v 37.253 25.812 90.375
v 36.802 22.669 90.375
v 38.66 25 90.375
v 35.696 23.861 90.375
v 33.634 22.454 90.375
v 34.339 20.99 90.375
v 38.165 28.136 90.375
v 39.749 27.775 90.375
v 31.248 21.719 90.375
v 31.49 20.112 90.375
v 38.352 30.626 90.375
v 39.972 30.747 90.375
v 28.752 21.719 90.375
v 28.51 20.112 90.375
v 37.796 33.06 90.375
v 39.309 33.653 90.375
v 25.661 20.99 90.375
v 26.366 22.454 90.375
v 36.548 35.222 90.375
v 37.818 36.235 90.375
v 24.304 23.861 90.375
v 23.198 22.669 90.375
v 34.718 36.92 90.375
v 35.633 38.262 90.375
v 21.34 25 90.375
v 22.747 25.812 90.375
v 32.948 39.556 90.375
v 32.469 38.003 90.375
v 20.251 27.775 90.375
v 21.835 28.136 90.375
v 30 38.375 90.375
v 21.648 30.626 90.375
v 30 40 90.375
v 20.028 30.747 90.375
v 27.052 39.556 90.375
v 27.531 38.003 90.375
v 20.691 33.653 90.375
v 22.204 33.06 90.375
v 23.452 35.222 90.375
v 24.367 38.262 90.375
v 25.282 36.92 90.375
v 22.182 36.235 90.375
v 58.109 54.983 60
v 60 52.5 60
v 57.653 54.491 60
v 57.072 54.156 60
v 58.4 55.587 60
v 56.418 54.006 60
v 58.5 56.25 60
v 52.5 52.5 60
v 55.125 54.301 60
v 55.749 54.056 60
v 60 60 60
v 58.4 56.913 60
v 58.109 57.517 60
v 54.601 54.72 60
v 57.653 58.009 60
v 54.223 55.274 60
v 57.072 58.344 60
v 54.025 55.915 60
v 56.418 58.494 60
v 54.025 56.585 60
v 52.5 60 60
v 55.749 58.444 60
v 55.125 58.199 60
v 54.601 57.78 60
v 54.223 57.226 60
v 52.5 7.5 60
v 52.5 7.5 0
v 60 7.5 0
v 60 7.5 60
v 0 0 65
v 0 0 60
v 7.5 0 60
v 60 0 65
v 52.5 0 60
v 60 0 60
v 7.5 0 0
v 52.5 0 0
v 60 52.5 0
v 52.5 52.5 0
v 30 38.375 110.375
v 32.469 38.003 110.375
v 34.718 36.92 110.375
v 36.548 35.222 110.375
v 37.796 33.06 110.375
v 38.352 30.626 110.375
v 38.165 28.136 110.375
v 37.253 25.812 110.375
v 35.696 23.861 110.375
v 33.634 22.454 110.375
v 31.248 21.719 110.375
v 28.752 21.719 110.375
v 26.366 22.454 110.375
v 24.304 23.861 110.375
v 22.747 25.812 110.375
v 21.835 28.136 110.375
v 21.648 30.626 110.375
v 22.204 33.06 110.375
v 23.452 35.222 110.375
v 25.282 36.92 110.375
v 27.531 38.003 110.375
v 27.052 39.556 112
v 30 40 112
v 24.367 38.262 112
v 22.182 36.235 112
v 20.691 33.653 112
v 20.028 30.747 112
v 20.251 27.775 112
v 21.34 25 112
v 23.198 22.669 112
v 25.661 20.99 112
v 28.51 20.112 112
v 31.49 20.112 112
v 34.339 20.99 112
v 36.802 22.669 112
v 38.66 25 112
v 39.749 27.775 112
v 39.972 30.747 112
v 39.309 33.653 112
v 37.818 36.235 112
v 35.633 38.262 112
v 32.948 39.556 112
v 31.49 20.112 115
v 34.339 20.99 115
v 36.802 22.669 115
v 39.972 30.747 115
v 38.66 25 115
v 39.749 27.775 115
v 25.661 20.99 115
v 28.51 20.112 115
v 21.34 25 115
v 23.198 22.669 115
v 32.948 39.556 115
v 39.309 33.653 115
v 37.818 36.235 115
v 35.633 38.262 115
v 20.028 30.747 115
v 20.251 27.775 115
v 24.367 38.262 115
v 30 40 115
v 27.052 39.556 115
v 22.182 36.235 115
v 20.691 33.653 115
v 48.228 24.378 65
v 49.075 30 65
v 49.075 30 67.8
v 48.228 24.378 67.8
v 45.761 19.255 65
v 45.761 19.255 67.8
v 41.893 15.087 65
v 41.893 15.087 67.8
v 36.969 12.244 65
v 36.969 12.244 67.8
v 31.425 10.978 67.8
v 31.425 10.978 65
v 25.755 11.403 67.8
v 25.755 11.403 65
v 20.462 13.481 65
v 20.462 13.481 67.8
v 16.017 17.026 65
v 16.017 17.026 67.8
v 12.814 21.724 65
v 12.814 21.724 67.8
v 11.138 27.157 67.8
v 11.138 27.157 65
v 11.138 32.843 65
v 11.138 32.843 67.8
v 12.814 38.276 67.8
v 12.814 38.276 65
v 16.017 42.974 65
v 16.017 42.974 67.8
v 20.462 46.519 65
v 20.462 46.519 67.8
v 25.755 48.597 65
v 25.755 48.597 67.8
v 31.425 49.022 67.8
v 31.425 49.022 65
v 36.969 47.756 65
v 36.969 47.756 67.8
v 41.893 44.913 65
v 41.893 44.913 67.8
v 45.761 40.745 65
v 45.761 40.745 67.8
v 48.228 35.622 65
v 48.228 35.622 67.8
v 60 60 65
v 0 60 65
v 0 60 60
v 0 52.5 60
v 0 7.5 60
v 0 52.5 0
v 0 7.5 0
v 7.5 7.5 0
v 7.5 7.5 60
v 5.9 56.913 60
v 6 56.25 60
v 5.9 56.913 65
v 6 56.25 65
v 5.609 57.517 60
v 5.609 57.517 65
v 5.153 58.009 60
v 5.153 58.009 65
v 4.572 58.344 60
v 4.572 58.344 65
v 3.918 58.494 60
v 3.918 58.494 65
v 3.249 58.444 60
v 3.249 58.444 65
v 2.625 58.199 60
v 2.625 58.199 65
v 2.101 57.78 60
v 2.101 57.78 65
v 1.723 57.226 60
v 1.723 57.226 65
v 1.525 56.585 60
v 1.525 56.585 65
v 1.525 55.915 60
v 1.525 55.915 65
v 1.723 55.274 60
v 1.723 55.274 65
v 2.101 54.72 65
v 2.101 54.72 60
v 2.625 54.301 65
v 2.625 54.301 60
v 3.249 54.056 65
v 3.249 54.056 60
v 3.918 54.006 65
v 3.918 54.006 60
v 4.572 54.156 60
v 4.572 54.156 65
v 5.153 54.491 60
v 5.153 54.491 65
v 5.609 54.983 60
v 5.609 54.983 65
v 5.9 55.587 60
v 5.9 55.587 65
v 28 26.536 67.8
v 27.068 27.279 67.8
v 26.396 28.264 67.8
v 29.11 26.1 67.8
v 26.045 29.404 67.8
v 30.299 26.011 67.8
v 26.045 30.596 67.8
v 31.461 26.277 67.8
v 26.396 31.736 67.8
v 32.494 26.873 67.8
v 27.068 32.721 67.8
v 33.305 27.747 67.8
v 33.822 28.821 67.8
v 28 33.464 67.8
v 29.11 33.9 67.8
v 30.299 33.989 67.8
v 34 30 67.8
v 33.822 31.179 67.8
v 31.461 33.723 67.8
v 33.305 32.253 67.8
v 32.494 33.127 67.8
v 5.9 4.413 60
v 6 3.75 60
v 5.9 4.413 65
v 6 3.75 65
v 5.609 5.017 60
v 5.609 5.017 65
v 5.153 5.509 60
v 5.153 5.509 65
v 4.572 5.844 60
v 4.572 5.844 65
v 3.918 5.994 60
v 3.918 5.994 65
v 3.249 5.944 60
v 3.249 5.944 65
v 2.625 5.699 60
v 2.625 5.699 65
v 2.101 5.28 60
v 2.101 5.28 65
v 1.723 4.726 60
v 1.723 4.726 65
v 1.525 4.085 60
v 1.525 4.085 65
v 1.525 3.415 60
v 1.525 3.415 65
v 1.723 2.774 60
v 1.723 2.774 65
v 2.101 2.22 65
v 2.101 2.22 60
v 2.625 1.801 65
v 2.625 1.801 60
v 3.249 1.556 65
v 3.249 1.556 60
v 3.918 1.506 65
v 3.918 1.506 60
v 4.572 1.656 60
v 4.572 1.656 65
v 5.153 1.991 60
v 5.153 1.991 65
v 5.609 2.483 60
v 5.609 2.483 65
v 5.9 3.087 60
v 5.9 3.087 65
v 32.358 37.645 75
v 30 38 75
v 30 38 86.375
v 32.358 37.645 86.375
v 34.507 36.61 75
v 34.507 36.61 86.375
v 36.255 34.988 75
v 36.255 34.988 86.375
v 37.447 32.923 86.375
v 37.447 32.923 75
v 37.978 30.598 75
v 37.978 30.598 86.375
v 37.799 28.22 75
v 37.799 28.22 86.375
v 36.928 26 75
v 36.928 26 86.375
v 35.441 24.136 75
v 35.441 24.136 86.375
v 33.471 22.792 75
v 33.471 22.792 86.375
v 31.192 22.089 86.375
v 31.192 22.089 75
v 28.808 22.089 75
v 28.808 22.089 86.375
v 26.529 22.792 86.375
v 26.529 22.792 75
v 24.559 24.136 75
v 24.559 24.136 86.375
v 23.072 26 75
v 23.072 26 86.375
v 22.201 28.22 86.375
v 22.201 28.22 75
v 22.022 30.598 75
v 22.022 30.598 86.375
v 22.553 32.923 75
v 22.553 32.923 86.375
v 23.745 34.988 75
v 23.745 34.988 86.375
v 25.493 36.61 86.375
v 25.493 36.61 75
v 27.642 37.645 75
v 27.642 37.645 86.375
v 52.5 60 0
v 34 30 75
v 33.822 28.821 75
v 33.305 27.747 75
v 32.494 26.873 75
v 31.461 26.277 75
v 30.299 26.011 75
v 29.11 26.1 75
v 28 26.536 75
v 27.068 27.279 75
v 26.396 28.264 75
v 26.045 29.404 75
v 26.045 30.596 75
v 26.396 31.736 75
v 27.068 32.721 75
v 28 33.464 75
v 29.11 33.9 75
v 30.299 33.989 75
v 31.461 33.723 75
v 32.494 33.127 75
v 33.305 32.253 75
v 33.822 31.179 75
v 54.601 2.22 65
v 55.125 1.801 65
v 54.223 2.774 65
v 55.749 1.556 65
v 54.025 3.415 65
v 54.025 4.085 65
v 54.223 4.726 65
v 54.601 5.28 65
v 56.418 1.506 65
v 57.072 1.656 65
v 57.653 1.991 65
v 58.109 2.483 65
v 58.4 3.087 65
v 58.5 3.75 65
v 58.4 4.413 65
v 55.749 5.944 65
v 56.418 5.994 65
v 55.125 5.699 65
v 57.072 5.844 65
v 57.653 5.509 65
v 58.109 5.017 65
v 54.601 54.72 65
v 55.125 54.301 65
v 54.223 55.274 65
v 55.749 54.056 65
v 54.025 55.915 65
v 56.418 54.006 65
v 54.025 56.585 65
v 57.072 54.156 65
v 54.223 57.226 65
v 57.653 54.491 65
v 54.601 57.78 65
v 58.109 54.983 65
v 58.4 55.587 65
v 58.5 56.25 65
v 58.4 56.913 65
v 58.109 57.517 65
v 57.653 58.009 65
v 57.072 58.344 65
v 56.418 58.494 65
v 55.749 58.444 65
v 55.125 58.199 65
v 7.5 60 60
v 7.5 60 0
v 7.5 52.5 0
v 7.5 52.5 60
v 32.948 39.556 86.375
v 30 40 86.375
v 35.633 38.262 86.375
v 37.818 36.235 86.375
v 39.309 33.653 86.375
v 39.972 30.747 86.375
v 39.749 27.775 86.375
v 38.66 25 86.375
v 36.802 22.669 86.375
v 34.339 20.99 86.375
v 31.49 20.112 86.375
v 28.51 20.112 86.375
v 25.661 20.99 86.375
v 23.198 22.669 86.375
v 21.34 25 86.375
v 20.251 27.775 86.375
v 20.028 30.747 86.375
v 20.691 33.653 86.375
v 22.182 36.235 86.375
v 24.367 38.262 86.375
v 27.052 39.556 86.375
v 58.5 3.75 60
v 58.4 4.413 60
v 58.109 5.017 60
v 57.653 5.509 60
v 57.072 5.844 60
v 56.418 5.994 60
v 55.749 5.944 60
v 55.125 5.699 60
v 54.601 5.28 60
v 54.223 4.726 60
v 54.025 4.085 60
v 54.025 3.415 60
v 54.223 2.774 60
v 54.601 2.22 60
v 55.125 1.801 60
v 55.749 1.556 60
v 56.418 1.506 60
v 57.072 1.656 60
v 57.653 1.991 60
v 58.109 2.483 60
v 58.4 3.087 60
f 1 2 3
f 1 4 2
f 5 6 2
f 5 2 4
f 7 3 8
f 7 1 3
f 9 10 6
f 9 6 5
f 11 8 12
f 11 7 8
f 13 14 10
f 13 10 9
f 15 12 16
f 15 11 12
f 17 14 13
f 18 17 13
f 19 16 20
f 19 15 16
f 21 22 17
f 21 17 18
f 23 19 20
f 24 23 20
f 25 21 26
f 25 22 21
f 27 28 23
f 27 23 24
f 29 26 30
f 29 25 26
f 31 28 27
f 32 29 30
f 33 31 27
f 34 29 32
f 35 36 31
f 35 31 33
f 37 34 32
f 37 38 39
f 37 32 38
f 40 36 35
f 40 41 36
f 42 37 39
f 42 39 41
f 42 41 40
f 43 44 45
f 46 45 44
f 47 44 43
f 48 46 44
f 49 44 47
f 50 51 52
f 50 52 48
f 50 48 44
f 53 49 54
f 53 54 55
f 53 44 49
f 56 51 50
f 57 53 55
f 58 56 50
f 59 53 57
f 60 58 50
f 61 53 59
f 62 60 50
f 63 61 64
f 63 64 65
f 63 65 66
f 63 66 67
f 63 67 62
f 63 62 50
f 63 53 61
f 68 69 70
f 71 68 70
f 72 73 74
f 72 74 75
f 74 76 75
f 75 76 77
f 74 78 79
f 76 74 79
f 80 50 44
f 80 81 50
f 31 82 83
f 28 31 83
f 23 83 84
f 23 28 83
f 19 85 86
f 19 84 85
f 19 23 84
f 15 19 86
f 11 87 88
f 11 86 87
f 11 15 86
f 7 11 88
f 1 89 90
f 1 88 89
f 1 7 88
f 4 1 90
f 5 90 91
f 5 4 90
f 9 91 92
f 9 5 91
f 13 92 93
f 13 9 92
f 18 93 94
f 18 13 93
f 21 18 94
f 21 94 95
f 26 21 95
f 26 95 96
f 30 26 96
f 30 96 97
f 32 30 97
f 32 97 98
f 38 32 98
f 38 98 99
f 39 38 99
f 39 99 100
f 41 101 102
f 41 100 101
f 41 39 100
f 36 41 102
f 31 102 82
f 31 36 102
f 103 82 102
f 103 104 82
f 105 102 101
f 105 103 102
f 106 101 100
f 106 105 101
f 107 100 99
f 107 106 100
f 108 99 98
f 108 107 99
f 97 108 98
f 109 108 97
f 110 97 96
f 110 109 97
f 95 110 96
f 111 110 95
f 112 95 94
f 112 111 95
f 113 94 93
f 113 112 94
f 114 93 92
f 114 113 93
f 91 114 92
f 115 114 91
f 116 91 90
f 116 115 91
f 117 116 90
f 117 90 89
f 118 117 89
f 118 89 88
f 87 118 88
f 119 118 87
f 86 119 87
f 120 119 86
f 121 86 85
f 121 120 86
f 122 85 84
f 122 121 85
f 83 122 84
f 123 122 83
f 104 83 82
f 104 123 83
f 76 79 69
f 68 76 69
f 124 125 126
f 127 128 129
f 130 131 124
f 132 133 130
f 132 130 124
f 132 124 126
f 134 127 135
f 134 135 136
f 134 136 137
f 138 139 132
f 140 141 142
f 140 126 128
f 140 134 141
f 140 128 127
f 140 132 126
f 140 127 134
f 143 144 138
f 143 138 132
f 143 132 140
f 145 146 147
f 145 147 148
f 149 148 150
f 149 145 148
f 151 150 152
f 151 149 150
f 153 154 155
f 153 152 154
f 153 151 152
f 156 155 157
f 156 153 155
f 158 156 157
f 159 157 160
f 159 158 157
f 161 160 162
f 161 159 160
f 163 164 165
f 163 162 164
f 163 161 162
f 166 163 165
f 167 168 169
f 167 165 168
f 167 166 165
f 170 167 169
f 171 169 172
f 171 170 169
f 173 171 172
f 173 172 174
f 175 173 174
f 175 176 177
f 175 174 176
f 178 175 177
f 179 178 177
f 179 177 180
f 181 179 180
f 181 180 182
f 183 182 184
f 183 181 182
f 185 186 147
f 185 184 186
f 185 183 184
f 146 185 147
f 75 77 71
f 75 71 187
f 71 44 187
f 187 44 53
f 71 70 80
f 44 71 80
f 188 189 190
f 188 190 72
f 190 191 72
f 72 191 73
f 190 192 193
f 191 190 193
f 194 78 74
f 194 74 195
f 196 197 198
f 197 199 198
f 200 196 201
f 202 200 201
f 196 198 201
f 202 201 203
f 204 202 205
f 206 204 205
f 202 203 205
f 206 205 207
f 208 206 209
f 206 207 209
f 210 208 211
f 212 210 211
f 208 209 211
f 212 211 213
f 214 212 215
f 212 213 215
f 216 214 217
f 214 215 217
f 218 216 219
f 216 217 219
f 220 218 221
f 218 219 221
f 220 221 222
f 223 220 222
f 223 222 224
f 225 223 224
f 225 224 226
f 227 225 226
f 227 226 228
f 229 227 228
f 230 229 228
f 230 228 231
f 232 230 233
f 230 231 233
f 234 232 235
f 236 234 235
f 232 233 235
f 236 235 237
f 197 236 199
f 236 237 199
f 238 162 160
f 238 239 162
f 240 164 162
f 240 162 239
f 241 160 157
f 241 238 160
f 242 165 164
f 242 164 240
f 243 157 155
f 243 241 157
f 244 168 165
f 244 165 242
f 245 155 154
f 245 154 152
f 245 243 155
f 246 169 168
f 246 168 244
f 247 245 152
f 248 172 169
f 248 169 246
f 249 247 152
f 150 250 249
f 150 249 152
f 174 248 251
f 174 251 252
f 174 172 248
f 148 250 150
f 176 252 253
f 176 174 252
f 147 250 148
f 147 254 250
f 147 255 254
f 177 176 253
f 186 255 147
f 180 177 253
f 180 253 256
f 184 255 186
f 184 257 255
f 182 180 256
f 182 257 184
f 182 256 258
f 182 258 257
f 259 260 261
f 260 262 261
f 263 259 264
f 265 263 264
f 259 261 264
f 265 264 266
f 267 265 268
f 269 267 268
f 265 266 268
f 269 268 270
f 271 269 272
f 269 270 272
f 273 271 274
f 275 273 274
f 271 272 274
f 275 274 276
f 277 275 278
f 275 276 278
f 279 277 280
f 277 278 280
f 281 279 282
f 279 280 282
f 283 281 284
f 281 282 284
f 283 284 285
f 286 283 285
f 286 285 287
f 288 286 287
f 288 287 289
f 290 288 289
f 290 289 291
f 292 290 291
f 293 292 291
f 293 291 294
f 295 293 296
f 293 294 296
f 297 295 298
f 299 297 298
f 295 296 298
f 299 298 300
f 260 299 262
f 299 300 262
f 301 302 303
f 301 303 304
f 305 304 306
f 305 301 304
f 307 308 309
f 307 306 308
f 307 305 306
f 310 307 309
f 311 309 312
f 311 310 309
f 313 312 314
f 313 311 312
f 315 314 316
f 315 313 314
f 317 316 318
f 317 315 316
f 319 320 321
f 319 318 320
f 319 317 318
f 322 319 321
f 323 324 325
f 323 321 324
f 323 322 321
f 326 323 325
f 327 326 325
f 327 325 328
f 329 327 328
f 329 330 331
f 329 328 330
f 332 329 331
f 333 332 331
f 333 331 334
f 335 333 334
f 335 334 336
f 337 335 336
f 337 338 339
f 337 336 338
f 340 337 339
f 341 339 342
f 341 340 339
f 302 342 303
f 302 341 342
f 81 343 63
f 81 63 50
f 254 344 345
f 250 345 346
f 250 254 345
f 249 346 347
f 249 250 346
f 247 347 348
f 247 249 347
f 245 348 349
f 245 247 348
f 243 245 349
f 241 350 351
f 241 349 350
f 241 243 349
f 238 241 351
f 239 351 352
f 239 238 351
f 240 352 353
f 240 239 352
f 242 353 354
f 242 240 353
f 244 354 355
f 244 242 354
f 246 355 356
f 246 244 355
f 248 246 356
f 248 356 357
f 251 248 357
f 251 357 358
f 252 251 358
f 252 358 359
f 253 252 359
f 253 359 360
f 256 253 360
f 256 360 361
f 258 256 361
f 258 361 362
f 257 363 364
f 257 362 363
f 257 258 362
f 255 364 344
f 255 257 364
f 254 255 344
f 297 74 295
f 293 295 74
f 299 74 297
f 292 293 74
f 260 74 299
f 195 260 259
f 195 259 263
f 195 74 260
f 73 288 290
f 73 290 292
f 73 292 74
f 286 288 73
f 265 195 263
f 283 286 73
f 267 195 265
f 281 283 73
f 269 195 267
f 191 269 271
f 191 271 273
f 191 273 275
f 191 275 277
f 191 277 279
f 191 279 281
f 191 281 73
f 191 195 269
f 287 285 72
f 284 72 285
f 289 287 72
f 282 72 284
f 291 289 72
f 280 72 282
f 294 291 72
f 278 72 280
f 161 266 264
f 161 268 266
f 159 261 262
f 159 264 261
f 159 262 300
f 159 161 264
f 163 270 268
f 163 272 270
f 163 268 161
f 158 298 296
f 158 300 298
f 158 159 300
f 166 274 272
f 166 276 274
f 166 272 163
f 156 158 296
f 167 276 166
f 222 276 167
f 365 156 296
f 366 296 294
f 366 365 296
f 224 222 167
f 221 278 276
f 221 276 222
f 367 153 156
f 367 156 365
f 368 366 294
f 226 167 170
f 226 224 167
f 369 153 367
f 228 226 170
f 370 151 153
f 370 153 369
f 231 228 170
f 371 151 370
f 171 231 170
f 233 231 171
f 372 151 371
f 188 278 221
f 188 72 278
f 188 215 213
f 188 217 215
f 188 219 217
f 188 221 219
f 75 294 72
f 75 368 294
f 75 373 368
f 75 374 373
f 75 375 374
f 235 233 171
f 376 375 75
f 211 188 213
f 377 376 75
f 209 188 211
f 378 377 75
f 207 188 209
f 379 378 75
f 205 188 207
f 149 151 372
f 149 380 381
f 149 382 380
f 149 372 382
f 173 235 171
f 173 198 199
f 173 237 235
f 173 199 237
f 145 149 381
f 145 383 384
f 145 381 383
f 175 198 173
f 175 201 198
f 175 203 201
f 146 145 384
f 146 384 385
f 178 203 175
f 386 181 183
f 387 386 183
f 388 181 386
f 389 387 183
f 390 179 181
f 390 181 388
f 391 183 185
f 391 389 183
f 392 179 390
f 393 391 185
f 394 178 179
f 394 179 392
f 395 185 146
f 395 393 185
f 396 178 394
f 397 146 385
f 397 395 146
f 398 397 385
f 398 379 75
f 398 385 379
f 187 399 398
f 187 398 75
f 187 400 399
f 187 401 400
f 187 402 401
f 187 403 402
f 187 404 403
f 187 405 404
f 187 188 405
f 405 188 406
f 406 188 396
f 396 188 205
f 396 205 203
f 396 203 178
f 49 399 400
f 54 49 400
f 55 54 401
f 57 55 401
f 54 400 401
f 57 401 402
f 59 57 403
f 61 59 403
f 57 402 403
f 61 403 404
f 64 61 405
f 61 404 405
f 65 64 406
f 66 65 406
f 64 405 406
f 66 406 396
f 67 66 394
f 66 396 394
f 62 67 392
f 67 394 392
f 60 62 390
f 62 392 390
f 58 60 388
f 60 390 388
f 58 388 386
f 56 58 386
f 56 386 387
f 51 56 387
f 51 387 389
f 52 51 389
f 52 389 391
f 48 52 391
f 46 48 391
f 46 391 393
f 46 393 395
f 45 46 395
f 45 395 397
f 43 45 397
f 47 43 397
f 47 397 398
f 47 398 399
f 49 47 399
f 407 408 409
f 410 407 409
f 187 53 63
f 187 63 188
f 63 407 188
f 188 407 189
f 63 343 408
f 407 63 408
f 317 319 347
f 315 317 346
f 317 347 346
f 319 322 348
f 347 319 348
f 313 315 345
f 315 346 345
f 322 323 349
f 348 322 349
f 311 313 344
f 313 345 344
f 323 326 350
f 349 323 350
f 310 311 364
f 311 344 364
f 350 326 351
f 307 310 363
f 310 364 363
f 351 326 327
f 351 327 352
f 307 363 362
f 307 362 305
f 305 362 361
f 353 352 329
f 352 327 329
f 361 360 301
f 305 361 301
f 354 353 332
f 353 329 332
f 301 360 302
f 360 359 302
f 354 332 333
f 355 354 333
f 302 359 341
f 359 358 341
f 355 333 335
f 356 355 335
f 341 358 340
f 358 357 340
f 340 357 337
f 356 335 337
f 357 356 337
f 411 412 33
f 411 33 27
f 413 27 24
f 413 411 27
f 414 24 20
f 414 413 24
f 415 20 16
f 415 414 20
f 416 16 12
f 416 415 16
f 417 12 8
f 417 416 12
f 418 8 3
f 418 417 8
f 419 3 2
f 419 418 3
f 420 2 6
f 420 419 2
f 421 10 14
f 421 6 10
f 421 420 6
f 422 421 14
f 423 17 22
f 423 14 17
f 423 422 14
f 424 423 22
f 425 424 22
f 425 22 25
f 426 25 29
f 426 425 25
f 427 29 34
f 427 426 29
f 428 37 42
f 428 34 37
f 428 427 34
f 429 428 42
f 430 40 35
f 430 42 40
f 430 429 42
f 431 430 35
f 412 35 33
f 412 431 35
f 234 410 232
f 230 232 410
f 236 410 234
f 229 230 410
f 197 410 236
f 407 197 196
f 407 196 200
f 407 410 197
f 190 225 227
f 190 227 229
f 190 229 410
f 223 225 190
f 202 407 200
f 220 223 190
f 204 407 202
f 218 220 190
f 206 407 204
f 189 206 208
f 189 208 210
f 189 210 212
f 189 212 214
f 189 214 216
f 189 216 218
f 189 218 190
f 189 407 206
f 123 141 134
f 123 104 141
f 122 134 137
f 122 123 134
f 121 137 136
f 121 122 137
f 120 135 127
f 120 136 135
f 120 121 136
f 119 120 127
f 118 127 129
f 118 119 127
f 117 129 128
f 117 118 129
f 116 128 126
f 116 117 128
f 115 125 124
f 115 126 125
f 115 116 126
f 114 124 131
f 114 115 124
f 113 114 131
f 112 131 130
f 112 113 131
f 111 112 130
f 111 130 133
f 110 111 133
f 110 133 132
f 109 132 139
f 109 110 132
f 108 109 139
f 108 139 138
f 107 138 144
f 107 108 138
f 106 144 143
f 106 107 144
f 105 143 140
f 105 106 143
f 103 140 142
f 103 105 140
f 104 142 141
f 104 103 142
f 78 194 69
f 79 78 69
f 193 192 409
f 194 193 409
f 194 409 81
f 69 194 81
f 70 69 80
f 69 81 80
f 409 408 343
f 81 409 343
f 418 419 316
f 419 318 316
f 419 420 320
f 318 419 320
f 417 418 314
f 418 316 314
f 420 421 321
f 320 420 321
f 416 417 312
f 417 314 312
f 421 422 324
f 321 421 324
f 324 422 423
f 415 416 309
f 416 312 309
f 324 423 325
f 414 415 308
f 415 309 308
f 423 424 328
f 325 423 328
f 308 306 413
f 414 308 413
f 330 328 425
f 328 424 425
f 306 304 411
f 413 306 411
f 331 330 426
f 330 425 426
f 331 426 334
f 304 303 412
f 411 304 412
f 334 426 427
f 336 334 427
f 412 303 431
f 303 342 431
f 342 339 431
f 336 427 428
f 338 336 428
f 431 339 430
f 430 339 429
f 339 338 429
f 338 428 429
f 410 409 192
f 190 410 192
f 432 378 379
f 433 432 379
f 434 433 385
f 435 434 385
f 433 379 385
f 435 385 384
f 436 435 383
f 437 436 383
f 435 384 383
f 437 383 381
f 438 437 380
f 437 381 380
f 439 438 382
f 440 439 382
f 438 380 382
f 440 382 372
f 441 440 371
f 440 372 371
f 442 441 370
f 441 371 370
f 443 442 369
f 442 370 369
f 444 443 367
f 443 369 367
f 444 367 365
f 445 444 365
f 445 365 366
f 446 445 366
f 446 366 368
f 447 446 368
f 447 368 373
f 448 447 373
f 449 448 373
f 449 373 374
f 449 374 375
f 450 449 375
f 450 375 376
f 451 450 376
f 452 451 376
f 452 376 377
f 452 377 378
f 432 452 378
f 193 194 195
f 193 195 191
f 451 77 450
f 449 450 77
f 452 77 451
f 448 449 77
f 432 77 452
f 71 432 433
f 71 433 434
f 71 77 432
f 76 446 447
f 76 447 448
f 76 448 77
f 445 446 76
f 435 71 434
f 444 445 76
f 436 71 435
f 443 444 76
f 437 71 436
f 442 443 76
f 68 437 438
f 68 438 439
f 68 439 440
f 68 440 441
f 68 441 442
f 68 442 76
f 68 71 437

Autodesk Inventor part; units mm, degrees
ref_plane "XZ Plane" through (0, 0, 0) normal (0, 1, 0) x (-1, 0, 0)
ref_plane "XY Plane" through (0, 0, 0) normal (0, 0, 1) x (1, 0, 0)
sketch "Skizze1" plane through (0, 0, 0) normal (0, 0, 1) x (1, 0, 0)
  line L0 (0, 0) -> (60, 0)
  line L1 (60, 0) -> (60, 60)
  line L2 (60, 60) -> (0, 60)
  line L3 (0, 60) -> (0, 0)
  dimension "d0" = 60
  dimension "d1" = 60
extrude "Extrusion1" add sketch "Skizze1" along normal blind 65
sketch "Skizze2" plane through (0, 0, 65) normal (0, 0, 1) x (1, 0, 0)
  circle A0 centre (30, 30) radius 4
  line L0 (0, 0) -> (60, 0) projected
  line L1 (0, 60) -> (0, 0) projected
  dimension "d4" = 8
  dimension "d10" = 30
  dimension "d11" = 30
extrude "Extrusion2" add sketch "Skizze2" along normal blind 10
ref_plane "Arbeitsebene1" through (30, 0, 0) normal (1, 0, 0) x (0, 1, 0)
sketch "Skizze5" plane through (30, 0, 0) normal (1, 0, 0) x (0, 1, 0)
  line L0 (34, 75) -> (26, 75) projected
  line L1 (30, 75) -> (30, 115)
  line L2 (30, 115) -> (40, 115)
  line L3 (40, 115) -> (40, 112)
  line L4 (38.375, 110.375) -> (40, 112)
  line L5 (38.375, 110.375) -> (38.375, 90.375)
  line L6 (38.375, 90.375) -> (40, 90.375)
  line L7 (40, 90.375) -> (40, 86.375)
  line L8 (40, 86.375) -> (38, 86.375)
  line L9 (38, 86.375) -> (38, 75)
  line L10 (38, 75) -> (30, 75)
  point P0 (0, 0)
  dimension "d25" = 40
  dimension "d26" = 10
  dimension "d27" = 3
  dimension "d30" = 1.625
  dimension "d31" = 135
  dimension "d32" = 20
  dimension "d33" = 4
  dimension "d34" = 2
revolve "Umdrehung1" add sketch "Skizze5" angle 360 about axis through (30, 30, 75) along (0, 0, 1)
sketch "Skizze6" plane through (0, 0, 0) normal (0, 0, -1) x (-1, 0, 0)
  line L0 (0, 0) -> (-60, 0) projected
  line L1 (0, 0) -> (-7.5, 0)
  line L2 (-7.5, 0) -> (-7.5, 7.5)
  line L3 (-7.5, 7.5) -> (0, 7.5)
  line L4 (0, 7.5) -> (0, 0)
  line L5 (-60, 0) -> (-52.5, 0)
  line L6 (-52.5, 0) -> (-52.5, 7.5)
  line L7 (-52.5, 7.5) -> (-60, 7.5)
  line L8 (-60, 7.5) -> (-60, 0)
  line L9 (-60, 60) -> (0, 60) projected
  line L10 (-60, 60) -> (-52.5, 60)
  line L11 (-52.5, 60) -> (-52.5, 52.5)
  line L12 (-52.5, 52.5) -> (-60, 52.5)
  line L13 (-60, 52.5) -> (-60, 60)
  line L14 (0, 60) -> (-7.5, 60)
  line L15 (-7.5, 60) -> (-7.5, 52.5)
  line L16 (-7.5, 52.5) -> (0, 52.5)
  line L17 (0, 52.5) -> (0, 60)
  dimension "d36" = 7.5
  dimension "d37" = 7.5
  dimension "d38" = 7.5
  dimension "d39" = 7.5
  dimension "d40" = 7.5
  dimension "d41" = 7.5
  dimension "d42" = 7.5
  dimension "d43" = 7.5
extrude "Extrusion4" cut sketch "Skizze6" against normal blind 60
sketch "Skizze7" plane through (0, 0, 65) normal (0, 0, 1) x (1, 0, 0)
  circle A0 centre (3.75, 3.75) radius 2.25
  circle A1 centre (56.25, 3.75) radius 2.25
  circle A2 centre (56.25, 56.25) radius 2.25
  circle A3 centre (3.75, 56.25) radius 2.25
  point P0 (0, 0)
  dimension "d46" = 4.5
  dimension "d47" = 4.5
  dimension "d48" = 4.5
  dimension "d49" = 4.5
extrude "Extrusion5" cut sketch "Skizze7" against normal blind 5
sketch "Skizze8" plane through (0, 0, 65) normal (0, 0, 1) x (1, 0, 0)
  circle A0 centre (30, 30) radius 8 projected
  circle A1 centre (30, 30) radius 19.075
  point P0 (0, 0)
  dimension "d52" = 38.15
extrude "Extrusion6" add sketch "Skizze8" along normal blind 2.8 contours A0 | A1
properties part number "Motor"
